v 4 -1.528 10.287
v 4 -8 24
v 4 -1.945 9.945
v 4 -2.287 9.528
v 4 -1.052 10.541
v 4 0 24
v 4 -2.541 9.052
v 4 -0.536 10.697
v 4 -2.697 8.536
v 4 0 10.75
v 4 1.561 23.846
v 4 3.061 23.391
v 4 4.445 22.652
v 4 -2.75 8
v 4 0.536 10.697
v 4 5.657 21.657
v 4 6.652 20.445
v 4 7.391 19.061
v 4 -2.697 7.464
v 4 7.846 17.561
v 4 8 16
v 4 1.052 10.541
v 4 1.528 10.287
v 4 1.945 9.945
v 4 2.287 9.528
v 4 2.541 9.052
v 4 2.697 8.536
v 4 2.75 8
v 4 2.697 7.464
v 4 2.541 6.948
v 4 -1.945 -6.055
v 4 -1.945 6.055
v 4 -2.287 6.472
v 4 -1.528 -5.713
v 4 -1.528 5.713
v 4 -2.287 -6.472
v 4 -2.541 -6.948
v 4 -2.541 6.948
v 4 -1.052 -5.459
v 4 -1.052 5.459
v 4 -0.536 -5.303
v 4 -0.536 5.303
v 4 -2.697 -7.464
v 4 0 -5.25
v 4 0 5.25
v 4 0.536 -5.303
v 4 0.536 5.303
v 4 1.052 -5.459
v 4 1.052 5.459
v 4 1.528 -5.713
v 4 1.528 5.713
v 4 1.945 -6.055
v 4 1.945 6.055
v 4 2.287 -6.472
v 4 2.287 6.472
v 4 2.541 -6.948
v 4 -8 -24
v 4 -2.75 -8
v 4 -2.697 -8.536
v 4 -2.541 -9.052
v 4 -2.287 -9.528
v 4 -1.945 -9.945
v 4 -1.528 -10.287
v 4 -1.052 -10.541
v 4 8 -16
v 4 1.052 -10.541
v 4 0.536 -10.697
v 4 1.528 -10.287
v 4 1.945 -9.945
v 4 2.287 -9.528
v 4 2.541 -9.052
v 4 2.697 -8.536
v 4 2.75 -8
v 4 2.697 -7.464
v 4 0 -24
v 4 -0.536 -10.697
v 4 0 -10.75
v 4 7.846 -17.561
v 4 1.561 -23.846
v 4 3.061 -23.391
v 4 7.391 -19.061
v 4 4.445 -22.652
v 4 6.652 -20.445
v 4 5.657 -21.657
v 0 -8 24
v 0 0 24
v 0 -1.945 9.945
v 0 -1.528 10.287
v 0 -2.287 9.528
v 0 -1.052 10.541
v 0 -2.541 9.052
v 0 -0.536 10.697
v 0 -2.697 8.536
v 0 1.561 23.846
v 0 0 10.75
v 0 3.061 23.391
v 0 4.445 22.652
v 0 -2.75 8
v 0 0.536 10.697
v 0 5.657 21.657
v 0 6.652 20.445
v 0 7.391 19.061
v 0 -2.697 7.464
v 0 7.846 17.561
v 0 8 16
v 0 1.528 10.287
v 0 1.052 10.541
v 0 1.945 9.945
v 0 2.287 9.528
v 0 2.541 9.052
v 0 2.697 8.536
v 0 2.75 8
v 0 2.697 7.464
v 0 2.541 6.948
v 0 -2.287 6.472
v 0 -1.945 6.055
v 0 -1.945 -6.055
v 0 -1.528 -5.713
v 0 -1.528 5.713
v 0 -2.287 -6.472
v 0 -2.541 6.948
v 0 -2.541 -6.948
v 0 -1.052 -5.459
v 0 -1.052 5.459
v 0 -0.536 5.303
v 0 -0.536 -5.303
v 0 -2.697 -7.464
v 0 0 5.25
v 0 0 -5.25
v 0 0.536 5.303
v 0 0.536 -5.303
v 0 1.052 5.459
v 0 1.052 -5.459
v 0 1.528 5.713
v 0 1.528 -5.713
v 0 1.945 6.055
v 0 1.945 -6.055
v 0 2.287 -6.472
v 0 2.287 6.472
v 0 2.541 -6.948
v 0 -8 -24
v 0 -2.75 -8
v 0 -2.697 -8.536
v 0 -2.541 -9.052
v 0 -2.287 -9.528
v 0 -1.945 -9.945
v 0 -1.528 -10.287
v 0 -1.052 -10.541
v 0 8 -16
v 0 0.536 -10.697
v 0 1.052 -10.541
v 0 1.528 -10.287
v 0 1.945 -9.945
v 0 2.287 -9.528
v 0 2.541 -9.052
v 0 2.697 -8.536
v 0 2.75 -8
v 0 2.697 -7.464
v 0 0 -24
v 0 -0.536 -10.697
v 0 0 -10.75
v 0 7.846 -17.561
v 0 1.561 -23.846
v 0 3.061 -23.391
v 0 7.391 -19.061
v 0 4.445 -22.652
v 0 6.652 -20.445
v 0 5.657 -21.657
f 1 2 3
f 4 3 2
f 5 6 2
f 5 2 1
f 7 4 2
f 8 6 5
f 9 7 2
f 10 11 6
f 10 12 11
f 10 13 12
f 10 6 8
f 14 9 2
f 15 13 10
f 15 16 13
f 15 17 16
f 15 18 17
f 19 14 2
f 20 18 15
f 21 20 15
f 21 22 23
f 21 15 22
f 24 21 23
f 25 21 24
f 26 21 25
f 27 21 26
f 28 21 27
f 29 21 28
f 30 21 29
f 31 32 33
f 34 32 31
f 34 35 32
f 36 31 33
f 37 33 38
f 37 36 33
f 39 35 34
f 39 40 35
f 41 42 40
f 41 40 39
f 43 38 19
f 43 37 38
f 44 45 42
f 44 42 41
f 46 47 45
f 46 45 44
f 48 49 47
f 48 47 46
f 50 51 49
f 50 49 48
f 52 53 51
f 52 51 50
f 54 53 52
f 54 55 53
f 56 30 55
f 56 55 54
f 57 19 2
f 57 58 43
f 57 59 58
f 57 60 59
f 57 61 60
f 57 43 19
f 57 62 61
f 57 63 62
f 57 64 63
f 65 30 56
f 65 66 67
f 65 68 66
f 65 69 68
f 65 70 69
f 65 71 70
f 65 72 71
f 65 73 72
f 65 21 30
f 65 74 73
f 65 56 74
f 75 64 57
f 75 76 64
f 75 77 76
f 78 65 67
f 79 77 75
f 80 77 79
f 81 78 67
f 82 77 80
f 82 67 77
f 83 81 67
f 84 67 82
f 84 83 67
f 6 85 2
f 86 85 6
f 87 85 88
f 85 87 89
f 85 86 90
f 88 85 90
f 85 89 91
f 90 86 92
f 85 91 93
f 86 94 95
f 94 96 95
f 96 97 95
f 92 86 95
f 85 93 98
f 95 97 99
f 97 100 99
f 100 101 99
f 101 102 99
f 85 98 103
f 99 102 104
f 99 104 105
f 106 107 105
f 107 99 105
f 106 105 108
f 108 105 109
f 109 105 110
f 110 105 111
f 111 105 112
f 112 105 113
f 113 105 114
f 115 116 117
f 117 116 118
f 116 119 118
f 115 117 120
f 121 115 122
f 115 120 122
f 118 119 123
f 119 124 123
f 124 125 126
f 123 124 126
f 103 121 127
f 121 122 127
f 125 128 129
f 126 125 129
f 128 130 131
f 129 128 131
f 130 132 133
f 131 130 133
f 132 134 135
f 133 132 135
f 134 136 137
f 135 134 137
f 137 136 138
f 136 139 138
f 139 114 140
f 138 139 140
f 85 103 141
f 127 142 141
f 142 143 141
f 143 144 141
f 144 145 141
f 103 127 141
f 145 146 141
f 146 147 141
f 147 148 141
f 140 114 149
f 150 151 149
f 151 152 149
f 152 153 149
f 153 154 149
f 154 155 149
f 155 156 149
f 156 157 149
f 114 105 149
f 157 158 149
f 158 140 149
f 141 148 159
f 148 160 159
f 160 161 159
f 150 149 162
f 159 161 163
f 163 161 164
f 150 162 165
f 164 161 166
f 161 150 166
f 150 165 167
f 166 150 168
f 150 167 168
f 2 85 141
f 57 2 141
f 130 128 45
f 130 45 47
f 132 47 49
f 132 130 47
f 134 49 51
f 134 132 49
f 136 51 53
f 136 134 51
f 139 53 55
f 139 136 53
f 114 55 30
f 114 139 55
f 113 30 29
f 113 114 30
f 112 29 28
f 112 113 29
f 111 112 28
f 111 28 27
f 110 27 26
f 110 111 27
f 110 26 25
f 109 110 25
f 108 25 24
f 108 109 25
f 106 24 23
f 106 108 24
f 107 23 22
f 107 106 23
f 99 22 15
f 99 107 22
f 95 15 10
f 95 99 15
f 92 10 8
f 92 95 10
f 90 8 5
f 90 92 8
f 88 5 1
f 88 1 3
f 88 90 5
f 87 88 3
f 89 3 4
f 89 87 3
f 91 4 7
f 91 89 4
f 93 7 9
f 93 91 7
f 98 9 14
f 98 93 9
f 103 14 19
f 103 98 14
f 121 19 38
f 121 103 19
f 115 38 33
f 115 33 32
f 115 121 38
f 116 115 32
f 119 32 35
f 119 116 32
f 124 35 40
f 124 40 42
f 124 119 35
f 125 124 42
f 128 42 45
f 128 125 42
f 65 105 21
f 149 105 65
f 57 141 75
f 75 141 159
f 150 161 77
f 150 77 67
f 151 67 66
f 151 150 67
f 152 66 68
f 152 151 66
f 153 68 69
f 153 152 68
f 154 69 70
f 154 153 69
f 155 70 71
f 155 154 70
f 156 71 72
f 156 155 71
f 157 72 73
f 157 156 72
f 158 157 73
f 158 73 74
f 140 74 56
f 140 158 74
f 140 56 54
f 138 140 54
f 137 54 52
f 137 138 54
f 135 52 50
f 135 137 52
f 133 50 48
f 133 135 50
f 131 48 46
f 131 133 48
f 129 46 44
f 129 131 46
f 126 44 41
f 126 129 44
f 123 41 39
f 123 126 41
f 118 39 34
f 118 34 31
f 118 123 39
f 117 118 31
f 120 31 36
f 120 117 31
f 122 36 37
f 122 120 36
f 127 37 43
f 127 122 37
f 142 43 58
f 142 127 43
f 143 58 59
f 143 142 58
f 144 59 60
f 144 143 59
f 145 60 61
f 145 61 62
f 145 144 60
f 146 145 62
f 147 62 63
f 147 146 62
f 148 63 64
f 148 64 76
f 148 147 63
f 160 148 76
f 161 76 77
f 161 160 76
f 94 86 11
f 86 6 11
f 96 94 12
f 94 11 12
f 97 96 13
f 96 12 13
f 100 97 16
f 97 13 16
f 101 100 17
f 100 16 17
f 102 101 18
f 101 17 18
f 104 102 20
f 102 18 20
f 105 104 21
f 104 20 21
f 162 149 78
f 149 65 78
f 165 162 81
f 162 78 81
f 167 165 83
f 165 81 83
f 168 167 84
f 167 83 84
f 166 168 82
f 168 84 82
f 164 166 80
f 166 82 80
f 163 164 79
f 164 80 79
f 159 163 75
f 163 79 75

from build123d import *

# Parameters (mm, degrees)
SKETCH1_W           = 48
SKETCH1_H           = 16
SKETCH1_R           = 2.75
BOSS_EXTRUDE1_DEPTH = 4
FILLET1_R           = 8


with BuildPart() as part:
    # Sketch1 → Boss-Extrude1 (new body)
    with BuildSketch(Plane(origin=(0, 0, 0), x_dir=(0, 0, -1), z_dir=(1, 0, 0))):
        Rectangle(SKETCH1_W, SKETCH1_H)
        with Locations((-8, 0)):
            Circle(SKETCH1_R, mode=Mode.SUBTRACT)
        with Locations((8, 0)):
            Circle(SKETCH1_R, mode=Mode.SUBTRACT)
    extrude(amount=BOSS_EXTRUDE1_DEPTH)

    # Fillet1
    fillet1_edges = [part.edges().sort_by_distance(p)[0] for p in [
        (2, 8, 24),
        (2, 8, -24),
    ]]
    fillet(fillet1_edges, radius=FILLET1_R)


solid = part.part
